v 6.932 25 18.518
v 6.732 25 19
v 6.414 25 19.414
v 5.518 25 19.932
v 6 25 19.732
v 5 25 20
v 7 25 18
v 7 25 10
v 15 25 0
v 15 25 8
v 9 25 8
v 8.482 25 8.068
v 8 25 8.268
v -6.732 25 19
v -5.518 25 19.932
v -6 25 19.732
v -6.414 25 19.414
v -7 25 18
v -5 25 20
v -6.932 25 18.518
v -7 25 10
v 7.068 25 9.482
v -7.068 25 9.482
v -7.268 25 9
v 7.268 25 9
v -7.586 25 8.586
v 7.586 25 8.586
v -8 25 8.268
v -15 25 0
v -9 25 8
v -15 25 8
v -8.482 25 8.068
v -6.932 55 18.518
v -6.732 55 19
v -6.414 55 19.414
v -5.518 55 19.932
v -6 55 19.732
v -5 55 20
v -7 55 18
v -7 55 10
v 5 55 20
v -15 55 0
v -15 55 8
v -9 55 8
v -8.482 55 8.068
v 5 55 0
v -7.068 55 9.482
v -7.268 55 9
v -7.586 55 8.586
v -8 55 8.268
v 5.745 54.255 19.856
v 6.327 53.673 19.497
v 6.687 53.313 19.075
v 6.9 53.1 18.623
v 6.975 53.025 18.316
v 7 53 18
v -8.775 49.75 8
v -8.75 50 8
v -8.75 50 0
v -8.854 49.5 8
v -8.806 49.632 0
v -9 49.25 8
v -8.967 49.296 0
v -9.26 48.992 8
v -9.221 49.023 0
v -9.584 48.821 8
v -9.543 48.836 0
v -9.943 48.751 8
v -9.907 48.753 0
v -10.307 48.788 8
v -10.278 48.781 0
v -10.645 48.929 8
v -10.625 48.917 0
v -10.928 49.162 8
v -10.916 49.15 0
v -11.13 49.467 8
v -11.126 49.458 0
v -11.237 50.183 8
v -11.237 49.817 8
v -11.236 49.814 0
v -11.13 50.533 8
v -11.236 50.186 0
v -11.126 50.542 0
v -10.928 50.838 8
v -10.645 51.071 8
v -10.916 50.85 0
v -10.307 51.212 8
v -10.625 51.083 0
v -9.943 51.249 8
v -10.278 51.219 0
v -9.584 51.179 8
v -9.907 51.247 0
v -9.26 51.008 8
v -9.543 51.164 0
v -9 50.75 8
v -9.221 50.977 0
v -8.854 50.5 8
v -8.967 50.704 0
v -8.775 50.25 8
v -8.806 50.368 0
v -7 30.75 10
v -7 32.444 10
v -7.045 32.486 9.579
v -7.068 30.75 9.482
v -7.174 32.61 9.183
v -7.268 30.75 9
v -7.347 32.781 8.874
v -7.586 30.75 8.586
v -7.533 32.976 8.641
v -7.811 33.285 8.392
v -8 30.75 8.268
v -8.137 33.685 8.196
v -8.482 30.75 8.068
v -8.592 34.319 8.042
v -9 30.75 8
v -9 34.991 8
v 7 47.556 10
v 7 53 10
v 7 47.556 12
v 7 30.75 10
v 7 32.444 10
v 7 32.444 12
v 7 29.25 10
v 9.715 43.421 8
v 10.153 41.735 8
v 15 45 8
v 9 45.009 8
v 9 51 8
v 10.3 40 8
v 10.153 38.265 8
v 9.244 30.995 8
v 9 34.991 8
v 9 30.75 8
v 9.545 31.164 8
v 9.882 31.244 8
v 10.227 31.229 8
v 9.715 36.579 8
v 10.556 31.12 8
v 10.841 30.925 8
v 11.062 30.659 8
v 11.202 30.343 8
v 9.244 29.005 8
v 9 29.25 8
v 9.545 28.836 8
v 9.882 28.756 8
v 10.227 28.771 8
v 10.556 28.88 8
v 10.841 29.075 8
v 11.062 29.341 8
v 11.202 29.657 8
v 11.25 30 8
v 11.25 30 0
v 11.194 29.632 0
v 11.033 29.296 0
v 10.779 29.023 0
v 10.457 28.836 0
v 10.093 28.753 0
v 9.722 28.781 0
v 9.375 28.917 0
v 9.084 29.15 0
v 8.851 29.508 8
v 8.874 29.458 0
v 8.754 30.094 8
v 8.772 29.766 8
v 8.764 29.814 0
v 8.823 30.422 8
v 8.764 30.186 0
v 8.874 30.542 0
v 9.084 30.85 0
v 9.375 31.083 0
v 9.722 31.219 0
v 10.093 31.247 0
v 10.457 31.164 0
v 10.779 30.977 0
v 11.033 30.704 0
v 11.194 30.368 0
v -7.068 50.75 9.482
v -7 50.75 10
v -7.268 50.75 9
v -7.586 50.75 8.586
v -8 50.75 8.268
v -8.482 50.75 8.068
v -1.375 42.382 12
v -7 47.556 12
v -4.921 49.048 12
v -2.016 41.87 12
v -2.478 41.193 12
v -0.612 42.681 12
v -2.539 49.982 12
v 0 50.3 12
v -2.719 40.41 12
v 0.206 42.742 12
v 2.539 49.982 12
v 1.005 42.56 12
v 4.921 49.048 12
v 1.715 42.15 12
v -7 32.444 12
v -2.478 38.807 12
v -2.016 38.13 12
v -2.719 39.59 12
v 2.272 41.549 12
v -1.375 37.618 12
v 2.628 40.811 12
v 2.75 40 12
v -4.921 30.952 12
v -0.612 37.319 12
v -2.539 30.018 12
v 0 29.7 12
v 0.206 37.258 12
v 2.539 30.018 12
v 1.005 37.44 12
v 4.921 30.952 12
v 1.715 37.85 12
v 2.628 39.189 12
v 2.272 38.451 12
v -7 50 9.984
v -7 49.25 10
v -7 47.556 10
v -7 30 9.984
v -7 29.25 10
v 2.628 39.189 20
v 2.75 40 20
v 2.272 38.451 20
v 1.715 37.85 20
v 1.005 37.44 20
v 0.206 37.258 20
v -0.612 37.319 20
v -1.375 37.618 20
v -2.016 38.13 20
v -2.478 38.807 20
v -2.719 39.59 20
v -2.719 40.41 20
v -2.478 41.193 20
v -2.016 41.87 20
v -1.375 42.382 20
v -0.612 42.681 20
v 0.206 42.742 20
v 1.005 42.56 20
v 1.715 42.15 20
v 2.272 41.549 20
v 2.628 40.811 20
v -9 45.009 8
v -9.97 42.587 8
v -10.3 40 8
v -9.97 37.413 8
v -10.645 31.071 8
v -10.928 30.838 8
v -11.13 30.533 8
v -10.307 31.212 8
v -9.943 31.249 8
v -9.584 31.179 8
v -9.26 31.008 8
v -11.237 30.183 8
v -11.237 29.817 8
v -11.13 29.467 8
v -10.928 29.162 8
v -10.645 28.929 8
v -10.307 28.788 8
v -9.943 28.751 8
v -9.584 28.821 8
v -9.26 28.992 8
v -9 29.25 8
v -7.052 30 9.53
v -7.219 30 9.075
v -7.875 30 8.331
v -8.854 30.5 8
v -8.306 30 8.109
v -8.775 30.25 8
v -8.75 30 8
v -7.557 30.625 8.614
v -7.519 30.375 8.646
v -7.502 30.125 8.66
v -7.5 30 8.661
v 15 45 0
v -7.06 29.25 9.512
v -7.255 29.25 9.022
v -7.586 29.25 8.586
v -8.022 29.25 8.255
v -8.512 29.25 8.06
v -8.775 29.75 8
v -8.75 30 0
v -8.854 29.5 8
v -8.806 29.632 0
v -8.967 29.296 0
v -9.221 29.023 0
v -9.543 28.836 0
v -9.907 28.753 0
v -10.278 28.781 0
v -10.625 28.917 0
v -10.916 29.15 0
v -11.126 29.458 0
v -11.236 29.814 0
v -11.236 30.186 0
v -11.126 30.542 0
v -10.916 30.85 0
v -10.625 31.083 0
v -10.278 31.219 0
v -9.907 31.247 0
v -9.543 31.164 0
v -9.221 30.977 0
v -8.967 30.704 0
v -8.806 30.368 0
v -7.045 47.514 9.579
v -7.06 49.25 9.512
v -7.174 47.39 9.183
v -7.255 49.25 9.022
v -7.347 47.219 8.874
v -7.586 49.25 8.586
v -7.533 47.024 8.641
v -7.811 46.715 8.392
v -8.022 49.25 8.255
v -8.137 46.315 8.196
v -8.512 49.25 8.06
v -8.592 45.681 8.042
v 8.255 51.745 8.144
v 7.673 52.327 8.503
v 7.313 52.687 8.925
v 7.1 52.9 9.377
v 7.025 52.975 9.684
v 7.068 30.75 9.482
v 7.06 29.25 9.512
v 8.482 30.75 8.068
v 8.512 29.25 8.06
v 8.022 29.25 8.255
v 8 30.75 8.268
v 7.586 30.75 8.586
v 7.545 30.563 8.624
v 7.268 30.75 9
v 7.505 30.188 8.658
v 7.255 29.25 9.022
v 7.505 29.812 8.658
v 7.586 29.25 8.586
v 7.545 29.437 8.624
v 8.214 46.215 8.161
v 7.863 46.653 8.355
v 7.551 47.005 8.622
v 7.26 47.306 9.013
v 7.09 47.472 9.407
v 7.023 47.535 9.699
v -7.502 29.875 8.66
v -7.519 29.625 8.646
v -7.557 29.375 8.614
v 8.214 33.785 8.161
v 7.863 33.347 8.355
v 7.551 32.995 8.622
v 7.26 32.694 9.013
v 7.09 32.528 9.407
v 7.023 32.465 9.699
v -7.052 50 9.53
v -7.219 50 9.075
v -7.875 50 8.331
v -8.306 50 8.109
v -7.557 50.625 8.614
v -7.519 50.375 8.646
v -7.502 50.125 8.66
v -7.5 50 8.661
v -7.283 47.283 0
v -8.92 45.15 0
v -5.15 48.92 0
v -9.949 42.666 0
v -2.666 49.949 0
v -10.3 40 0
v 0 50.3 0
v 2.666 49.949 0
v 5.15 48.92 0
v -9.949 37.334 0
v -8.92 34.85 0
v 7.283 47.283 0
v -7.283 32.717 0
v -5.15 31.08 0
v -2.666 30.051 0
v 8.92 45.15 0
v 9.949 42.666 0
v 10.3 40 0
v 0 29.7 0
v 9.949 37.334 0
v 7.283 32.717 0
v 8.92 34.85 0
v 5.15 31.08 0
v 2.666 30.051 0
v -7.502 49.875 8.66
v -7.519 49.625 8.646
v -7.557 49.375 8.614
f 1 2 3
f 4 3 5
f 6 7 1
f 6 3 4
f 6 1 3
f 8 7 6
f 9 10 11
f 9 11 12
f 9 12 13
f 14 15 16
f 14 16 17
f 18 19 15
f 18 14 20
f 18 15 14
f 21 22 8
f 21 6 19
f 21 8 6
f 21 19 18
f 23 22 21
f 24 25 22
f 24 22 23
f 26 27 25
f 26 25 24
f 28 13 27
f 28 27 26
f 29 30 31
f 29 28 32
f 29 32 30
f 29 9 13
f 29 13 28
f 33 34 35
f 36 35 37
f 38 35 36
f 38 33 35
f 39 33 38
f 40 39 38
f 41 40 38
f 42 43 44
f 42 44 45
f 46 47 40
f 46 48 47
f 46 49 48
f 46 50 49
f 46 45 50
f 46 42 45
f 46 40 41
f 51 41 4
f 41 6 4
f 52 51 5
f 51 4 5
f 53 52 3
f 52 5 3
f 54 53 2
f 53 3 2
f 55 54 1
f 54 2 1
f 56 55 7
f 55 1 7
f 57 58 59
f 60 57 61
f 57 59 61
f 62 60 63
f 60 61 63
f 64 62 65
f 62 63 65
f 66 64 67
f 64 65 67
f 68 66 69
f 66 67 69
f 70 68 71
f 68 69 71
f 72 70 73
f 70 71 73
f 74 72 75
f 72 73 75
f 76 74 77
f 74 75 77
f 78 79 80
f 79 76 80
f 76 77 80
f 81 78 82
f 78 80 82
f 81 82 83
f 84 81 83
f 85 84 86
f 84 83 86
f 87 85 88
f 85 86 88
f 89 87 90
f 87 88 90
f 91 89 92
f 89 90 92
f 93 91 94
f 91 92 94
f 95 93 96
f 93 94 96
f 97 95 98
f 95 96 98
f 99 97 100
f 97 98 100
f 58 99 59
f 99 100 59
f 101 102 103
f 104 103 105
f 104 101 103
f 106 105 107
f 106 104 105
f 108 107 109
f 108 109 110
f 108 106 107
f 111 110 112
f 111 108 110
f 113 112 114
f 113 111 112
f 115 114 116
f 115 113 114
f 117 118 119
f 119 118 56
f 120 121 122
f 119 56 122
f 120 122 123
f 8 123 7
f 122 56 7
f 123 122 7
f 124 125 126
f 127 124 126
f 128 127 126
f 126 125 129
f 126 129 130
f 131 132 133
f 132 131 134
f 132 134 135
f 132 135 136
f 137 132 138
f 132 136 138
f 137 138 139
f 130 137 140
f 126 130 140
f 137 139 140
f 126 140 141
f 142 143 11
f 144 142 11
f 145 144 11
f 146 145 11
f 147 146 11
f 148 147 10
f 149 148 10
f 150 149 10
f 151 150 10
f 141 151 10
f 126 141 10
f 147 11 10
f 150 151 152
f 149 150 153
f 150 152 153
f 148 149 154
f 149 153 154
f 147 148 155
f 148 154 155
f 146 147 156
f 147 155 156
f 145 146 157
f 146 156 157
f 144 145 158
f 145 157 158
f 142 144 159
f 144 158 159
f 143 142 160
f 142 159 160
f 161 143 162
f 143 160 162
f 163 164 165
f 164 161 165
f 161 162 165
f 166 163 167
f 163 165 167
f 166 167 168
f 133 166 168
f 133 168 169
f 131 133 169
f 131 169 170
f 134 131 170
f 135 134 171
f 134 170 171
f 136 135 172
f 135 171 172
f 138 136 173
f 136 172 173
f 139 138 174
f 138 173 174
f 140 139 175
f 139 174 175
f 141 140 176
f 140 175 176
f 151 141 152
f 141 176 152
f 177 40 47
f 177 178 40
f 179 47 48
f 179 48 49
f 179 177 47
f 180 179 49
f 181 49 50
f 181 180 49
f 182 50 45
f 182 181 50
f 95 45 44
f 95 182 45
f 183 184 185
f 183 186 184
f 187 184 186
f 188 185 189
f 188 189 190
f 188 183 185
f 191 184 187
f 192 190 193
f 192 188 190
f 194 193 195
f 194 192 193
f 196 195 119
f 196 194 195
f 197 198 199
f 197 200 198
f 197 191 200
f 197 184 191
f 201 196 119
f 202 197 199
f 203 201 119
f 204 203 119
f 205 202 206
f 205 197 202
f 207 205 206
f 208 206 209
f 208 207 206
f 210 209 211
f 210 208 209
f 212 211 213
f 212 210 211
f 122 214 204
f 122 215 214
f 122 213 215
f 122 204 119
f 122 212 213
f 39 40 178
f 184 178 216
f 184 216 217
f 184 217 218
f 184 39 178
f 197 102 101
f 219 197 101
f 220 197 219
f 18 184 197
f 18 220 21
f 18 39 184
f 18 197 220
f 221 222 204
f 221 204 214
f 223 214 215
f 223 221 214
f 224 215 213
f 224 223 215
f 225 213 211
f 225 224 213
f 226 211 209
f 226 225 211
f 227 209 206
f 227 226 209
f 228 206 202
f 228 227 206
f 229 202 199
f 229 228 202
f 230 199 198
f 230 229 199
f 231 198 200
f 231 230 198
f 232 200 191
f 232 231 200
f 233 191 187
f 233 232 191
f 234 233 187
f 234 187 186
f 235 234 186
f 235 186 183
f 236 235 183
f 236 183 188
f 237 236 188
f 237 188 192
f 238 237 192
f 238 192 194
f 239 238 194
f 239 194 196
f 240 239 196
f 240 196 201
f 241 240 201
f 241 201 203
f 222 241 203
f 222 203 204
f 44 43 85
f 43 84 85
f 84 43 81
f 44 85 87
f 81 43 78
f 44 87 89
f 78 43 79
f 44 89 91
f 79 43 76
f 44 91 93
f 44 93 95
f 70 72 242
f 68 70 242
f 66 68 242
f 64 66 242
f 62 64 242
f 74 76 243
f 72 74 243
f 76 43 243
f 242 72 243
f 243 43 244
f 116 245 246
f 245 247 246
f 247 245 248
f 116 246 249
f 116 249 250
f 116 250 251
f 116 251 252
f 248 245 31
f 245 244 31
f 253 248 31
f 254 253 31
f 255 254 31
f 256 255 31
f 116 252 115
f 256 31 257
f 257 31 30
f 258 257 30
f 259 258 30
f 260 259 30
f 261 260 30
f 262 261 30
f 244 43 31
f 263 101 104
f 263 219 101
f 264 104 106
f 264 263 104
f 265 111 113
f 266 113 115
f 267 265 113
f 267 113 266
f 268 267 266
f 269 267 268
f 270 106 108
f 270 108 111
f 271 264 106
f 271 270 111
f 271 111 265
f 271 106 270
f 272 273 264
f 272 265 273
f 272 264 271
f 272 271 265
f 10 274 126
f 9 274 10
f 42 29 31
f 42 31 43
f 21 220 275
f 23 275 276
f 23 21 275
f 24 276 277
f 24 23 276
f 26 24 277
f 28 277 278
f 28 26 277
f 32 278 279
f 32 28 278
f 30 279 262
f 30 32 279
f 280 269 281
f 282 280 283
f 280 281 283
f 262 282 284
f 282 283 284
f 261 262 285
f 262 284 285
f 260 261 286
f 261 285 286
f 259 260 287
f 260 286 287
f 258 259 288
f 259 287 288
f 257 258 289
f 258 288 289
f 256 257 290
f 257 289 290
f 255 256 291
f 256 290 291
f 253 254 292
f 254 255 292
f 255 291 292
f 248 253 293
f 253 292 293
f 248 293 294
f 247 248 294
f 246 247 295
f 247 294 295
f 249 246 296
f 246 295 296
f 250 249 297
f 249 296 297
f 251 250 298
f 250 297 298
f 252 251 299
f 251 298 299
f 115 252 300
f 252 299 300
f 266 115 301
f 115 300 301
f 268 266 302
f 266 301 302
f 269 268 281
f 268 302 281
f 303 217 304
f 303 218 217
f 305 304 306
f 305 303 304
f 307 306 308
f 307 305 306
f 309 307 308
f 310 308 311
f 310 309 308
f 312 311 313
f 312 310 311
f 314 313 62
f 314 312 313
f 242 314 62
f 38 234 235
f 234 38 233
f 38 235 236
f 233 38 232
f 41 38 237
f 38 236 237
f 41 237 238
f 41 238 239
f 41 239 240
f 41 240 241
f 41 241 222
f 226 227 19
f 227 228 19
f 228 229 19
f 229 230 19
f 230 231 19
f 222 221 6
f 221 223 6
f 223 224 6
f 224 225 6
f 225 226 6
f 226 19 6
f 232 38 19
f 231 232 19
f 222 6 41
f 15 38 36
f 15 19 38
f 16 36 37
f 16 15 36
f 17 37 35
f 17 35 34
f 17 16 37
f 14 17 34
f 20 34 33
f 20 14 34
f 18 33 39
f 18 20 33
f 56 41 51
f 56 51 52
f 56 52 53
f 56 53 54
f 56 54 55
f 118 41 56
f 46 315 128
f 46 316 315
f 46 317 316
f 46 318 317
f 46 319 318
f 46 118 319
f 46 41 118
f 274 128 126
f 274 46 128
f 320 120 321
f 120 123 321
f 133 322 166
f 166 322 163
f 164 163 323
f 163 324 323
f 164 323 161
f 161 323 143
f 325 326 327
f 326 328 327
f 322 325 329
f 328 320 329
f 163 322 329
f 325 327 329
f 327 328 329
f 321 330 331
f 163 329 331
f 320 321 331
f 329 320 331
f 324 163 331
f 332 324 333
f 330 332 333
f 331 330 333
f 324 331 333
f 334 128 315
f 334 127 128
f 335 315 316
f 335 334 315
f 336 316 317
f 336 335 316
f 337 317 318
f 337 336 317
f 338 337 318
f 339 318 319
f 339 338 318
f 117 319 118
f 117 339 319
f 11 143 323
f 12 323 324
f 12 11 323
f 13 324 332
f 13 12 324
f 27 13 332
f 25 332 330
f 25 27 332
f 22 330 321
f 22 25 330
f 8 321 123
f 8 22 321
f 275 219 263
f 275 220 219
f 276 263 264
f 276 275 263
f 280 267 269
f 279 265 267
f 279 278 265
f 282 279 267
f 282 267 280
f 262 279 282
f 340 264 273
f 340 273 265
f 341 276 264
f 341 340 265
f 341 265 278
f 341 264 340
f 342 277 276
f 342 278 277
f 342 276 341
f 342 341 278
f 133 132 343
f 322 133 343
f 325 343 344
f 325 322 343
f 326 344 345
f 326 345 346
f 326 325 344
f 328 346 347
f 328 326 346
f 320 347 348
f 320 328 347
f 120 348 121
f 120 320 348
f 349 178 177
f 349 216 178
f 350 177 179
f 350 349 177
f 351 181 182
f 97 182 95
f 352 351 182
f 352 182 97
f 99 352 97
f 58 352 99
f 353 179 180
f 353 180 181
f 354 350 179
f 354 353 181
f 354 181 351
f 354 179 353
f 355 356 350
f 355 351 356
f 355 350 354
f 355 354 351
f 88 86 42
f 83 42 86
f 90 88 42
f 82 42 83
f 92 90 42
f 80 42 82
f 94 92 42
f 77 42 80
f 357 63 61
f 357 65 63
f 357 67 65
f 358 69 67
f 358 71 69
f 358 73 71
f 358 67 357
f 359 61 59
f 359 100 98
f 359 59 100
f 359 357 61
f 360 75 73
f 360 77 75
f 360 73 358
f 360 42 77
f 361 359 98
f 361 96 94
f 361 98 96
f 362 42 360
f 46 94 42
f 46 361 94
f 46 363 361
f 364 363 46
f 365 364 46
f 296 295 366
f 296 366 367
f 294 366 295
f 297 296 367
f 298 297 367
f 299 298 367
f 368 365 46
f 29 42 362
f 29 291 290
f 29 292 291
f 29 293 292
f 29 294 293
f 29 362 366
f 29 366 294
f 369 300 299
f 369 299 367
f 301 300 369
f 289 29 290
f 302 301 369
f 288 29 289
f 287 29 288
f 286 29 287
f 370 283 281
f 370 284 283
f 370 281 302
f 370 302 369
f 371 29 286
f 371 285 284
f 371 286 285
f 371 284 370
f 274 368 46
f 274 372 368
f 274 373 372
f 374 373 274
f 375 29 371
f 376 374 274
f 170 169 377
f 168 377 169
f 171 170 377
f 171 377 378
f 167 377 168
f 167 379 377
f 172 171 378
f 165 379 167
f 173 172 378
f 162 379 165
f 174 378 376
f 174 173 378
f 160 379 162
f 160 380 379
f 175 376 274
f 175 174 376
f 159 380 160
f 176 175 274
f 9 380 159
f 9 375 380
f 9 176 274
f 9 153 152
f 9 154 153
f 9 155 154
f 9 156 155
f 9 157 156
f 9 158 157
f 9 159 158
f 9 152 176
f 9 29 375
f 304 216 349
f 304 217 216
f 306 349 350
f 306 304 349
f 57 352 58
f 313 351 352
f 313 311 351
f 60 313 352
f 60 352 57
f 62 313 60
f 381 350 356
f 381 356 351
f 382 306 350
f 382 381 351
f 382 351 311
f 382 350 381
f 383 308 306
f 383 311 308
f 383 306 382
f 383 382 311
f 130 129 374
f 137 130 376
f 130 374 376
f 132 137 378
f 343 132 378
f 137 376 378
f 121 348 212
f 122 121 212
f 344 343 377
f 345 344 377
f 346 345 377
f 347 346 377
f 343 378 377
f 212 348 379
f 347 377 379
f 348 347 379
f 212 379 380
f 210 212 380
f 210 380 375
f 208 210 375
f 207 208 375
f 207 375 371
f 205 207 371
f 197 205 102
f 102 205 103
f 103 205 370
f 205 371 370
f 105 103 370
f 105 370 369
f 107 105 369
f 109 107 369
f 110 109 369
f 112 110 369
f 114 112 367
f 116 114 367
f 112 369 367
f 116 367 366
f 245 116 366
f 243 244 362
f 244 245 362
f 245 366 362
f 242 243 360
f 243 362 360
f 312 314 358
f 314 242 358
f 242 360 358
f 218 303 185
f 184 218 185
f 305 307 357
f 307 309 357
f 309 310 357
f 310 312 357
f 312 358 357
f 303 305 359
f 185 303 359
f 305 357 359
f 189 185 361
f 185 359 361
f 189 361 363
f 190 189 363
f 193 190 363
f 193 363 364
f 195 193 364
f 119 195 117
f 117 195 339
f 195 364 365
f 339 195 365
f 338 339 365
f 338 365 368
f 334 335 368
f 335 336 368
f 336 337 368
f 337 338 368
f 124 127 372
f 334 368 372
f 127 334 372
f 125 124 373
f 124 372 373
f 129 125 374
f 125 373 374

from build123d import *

# Parameters (mm, degrees)
SKETCH1_R          = 1.25
MAIN_DEPTH         = 20
SKETCH2_R          = 10.3
CENTRALHOLE_DEPTH  = 12
SKETCH5_R          = 2.75
SKETCH5_W          = 8
SKETCH5_H          = 30
CUT_EXTRUDE3_DEPTH = 12
FILLET1_R          = 2
SKETCH6_W          = 30
SKETCH6_H          = 30
CUT_EXTRUDE4_DEPTH = 21.0000001


with BuildPart() as part:
    # Sketch1 → Main (new body)
    with BuildSketch(Plane.XY):
        Polygon((-15, -15), (5, -15), (15, -5), (15, 15), (-15, 15), align=None)
        with Locations((-10, 10)):
            Circle(SKETCH1_R, mode=Mode.SUBTRACT)
        with Locations((10, 10)):
            Circle(SKETCH1_R, mode=Mode.SUBTRACT)
        with Locations((-10, -10)):
            Circle(SKETCH1_R, mode=Mode.SUBTRACT)
    extrude(amount=MAIN_DEPTH)

    # Sketch2 → CentralHole (cut)
    with BuildSketch(Plane.XY):
        Circle(SKETCH2_R)
    extrude(amount=CENTRALHOLE_DEPTH, mode=Mode.SUBTRACT)

    # Sketch5 → Cut-Extrude3 (cut)
    with BuildSketch(Plane.XY.offset(20)):
        Circle(SKETCH5_R)
        with Locations((11, 0)):
            Rectangle(SKETCH5_W, SKETCH5_H)
        with Locations((-11, 0)):
            Rectangle(SKETCH5_W, SKETCH5_H)
    extrude(amount=-CUT_EXTRUDE3_DEPTH, mode=Mode.SUBTRACT)

    # Fillet1
    fillet1_edges = [part.edges().sort_by_distance(p)[0] for p in [
        (-7, 0, 20),
        (7, 1, 20),
        (-7, 11.27789624, 8),
        (-7, -11.27789624, 8),
        (7, 11.27789624, 8),
        (7, -10.27789624, 8),
    ]]
    fillet(fillet1_edges, radius=FILLET1_R)


with BuildPart() as body_2:
    # Mirror1: mirrored copy
    add(part.part.mirror(Plane.ZX.offset(20)))


with BuildPart() as part_1:
    add(part.part)

    # Sketch6 → Cut-Extrude4 (cut, through all)
    with BuildSketch(Plane.XY.offset(20)):
        Rectangle(SKETCH6_W, SKETCH6_H)
    extrude(amount=-CUT_EXTRUDE4_DEPTH, mode=Mode.SUBTRACT)


solid = body_2.part
